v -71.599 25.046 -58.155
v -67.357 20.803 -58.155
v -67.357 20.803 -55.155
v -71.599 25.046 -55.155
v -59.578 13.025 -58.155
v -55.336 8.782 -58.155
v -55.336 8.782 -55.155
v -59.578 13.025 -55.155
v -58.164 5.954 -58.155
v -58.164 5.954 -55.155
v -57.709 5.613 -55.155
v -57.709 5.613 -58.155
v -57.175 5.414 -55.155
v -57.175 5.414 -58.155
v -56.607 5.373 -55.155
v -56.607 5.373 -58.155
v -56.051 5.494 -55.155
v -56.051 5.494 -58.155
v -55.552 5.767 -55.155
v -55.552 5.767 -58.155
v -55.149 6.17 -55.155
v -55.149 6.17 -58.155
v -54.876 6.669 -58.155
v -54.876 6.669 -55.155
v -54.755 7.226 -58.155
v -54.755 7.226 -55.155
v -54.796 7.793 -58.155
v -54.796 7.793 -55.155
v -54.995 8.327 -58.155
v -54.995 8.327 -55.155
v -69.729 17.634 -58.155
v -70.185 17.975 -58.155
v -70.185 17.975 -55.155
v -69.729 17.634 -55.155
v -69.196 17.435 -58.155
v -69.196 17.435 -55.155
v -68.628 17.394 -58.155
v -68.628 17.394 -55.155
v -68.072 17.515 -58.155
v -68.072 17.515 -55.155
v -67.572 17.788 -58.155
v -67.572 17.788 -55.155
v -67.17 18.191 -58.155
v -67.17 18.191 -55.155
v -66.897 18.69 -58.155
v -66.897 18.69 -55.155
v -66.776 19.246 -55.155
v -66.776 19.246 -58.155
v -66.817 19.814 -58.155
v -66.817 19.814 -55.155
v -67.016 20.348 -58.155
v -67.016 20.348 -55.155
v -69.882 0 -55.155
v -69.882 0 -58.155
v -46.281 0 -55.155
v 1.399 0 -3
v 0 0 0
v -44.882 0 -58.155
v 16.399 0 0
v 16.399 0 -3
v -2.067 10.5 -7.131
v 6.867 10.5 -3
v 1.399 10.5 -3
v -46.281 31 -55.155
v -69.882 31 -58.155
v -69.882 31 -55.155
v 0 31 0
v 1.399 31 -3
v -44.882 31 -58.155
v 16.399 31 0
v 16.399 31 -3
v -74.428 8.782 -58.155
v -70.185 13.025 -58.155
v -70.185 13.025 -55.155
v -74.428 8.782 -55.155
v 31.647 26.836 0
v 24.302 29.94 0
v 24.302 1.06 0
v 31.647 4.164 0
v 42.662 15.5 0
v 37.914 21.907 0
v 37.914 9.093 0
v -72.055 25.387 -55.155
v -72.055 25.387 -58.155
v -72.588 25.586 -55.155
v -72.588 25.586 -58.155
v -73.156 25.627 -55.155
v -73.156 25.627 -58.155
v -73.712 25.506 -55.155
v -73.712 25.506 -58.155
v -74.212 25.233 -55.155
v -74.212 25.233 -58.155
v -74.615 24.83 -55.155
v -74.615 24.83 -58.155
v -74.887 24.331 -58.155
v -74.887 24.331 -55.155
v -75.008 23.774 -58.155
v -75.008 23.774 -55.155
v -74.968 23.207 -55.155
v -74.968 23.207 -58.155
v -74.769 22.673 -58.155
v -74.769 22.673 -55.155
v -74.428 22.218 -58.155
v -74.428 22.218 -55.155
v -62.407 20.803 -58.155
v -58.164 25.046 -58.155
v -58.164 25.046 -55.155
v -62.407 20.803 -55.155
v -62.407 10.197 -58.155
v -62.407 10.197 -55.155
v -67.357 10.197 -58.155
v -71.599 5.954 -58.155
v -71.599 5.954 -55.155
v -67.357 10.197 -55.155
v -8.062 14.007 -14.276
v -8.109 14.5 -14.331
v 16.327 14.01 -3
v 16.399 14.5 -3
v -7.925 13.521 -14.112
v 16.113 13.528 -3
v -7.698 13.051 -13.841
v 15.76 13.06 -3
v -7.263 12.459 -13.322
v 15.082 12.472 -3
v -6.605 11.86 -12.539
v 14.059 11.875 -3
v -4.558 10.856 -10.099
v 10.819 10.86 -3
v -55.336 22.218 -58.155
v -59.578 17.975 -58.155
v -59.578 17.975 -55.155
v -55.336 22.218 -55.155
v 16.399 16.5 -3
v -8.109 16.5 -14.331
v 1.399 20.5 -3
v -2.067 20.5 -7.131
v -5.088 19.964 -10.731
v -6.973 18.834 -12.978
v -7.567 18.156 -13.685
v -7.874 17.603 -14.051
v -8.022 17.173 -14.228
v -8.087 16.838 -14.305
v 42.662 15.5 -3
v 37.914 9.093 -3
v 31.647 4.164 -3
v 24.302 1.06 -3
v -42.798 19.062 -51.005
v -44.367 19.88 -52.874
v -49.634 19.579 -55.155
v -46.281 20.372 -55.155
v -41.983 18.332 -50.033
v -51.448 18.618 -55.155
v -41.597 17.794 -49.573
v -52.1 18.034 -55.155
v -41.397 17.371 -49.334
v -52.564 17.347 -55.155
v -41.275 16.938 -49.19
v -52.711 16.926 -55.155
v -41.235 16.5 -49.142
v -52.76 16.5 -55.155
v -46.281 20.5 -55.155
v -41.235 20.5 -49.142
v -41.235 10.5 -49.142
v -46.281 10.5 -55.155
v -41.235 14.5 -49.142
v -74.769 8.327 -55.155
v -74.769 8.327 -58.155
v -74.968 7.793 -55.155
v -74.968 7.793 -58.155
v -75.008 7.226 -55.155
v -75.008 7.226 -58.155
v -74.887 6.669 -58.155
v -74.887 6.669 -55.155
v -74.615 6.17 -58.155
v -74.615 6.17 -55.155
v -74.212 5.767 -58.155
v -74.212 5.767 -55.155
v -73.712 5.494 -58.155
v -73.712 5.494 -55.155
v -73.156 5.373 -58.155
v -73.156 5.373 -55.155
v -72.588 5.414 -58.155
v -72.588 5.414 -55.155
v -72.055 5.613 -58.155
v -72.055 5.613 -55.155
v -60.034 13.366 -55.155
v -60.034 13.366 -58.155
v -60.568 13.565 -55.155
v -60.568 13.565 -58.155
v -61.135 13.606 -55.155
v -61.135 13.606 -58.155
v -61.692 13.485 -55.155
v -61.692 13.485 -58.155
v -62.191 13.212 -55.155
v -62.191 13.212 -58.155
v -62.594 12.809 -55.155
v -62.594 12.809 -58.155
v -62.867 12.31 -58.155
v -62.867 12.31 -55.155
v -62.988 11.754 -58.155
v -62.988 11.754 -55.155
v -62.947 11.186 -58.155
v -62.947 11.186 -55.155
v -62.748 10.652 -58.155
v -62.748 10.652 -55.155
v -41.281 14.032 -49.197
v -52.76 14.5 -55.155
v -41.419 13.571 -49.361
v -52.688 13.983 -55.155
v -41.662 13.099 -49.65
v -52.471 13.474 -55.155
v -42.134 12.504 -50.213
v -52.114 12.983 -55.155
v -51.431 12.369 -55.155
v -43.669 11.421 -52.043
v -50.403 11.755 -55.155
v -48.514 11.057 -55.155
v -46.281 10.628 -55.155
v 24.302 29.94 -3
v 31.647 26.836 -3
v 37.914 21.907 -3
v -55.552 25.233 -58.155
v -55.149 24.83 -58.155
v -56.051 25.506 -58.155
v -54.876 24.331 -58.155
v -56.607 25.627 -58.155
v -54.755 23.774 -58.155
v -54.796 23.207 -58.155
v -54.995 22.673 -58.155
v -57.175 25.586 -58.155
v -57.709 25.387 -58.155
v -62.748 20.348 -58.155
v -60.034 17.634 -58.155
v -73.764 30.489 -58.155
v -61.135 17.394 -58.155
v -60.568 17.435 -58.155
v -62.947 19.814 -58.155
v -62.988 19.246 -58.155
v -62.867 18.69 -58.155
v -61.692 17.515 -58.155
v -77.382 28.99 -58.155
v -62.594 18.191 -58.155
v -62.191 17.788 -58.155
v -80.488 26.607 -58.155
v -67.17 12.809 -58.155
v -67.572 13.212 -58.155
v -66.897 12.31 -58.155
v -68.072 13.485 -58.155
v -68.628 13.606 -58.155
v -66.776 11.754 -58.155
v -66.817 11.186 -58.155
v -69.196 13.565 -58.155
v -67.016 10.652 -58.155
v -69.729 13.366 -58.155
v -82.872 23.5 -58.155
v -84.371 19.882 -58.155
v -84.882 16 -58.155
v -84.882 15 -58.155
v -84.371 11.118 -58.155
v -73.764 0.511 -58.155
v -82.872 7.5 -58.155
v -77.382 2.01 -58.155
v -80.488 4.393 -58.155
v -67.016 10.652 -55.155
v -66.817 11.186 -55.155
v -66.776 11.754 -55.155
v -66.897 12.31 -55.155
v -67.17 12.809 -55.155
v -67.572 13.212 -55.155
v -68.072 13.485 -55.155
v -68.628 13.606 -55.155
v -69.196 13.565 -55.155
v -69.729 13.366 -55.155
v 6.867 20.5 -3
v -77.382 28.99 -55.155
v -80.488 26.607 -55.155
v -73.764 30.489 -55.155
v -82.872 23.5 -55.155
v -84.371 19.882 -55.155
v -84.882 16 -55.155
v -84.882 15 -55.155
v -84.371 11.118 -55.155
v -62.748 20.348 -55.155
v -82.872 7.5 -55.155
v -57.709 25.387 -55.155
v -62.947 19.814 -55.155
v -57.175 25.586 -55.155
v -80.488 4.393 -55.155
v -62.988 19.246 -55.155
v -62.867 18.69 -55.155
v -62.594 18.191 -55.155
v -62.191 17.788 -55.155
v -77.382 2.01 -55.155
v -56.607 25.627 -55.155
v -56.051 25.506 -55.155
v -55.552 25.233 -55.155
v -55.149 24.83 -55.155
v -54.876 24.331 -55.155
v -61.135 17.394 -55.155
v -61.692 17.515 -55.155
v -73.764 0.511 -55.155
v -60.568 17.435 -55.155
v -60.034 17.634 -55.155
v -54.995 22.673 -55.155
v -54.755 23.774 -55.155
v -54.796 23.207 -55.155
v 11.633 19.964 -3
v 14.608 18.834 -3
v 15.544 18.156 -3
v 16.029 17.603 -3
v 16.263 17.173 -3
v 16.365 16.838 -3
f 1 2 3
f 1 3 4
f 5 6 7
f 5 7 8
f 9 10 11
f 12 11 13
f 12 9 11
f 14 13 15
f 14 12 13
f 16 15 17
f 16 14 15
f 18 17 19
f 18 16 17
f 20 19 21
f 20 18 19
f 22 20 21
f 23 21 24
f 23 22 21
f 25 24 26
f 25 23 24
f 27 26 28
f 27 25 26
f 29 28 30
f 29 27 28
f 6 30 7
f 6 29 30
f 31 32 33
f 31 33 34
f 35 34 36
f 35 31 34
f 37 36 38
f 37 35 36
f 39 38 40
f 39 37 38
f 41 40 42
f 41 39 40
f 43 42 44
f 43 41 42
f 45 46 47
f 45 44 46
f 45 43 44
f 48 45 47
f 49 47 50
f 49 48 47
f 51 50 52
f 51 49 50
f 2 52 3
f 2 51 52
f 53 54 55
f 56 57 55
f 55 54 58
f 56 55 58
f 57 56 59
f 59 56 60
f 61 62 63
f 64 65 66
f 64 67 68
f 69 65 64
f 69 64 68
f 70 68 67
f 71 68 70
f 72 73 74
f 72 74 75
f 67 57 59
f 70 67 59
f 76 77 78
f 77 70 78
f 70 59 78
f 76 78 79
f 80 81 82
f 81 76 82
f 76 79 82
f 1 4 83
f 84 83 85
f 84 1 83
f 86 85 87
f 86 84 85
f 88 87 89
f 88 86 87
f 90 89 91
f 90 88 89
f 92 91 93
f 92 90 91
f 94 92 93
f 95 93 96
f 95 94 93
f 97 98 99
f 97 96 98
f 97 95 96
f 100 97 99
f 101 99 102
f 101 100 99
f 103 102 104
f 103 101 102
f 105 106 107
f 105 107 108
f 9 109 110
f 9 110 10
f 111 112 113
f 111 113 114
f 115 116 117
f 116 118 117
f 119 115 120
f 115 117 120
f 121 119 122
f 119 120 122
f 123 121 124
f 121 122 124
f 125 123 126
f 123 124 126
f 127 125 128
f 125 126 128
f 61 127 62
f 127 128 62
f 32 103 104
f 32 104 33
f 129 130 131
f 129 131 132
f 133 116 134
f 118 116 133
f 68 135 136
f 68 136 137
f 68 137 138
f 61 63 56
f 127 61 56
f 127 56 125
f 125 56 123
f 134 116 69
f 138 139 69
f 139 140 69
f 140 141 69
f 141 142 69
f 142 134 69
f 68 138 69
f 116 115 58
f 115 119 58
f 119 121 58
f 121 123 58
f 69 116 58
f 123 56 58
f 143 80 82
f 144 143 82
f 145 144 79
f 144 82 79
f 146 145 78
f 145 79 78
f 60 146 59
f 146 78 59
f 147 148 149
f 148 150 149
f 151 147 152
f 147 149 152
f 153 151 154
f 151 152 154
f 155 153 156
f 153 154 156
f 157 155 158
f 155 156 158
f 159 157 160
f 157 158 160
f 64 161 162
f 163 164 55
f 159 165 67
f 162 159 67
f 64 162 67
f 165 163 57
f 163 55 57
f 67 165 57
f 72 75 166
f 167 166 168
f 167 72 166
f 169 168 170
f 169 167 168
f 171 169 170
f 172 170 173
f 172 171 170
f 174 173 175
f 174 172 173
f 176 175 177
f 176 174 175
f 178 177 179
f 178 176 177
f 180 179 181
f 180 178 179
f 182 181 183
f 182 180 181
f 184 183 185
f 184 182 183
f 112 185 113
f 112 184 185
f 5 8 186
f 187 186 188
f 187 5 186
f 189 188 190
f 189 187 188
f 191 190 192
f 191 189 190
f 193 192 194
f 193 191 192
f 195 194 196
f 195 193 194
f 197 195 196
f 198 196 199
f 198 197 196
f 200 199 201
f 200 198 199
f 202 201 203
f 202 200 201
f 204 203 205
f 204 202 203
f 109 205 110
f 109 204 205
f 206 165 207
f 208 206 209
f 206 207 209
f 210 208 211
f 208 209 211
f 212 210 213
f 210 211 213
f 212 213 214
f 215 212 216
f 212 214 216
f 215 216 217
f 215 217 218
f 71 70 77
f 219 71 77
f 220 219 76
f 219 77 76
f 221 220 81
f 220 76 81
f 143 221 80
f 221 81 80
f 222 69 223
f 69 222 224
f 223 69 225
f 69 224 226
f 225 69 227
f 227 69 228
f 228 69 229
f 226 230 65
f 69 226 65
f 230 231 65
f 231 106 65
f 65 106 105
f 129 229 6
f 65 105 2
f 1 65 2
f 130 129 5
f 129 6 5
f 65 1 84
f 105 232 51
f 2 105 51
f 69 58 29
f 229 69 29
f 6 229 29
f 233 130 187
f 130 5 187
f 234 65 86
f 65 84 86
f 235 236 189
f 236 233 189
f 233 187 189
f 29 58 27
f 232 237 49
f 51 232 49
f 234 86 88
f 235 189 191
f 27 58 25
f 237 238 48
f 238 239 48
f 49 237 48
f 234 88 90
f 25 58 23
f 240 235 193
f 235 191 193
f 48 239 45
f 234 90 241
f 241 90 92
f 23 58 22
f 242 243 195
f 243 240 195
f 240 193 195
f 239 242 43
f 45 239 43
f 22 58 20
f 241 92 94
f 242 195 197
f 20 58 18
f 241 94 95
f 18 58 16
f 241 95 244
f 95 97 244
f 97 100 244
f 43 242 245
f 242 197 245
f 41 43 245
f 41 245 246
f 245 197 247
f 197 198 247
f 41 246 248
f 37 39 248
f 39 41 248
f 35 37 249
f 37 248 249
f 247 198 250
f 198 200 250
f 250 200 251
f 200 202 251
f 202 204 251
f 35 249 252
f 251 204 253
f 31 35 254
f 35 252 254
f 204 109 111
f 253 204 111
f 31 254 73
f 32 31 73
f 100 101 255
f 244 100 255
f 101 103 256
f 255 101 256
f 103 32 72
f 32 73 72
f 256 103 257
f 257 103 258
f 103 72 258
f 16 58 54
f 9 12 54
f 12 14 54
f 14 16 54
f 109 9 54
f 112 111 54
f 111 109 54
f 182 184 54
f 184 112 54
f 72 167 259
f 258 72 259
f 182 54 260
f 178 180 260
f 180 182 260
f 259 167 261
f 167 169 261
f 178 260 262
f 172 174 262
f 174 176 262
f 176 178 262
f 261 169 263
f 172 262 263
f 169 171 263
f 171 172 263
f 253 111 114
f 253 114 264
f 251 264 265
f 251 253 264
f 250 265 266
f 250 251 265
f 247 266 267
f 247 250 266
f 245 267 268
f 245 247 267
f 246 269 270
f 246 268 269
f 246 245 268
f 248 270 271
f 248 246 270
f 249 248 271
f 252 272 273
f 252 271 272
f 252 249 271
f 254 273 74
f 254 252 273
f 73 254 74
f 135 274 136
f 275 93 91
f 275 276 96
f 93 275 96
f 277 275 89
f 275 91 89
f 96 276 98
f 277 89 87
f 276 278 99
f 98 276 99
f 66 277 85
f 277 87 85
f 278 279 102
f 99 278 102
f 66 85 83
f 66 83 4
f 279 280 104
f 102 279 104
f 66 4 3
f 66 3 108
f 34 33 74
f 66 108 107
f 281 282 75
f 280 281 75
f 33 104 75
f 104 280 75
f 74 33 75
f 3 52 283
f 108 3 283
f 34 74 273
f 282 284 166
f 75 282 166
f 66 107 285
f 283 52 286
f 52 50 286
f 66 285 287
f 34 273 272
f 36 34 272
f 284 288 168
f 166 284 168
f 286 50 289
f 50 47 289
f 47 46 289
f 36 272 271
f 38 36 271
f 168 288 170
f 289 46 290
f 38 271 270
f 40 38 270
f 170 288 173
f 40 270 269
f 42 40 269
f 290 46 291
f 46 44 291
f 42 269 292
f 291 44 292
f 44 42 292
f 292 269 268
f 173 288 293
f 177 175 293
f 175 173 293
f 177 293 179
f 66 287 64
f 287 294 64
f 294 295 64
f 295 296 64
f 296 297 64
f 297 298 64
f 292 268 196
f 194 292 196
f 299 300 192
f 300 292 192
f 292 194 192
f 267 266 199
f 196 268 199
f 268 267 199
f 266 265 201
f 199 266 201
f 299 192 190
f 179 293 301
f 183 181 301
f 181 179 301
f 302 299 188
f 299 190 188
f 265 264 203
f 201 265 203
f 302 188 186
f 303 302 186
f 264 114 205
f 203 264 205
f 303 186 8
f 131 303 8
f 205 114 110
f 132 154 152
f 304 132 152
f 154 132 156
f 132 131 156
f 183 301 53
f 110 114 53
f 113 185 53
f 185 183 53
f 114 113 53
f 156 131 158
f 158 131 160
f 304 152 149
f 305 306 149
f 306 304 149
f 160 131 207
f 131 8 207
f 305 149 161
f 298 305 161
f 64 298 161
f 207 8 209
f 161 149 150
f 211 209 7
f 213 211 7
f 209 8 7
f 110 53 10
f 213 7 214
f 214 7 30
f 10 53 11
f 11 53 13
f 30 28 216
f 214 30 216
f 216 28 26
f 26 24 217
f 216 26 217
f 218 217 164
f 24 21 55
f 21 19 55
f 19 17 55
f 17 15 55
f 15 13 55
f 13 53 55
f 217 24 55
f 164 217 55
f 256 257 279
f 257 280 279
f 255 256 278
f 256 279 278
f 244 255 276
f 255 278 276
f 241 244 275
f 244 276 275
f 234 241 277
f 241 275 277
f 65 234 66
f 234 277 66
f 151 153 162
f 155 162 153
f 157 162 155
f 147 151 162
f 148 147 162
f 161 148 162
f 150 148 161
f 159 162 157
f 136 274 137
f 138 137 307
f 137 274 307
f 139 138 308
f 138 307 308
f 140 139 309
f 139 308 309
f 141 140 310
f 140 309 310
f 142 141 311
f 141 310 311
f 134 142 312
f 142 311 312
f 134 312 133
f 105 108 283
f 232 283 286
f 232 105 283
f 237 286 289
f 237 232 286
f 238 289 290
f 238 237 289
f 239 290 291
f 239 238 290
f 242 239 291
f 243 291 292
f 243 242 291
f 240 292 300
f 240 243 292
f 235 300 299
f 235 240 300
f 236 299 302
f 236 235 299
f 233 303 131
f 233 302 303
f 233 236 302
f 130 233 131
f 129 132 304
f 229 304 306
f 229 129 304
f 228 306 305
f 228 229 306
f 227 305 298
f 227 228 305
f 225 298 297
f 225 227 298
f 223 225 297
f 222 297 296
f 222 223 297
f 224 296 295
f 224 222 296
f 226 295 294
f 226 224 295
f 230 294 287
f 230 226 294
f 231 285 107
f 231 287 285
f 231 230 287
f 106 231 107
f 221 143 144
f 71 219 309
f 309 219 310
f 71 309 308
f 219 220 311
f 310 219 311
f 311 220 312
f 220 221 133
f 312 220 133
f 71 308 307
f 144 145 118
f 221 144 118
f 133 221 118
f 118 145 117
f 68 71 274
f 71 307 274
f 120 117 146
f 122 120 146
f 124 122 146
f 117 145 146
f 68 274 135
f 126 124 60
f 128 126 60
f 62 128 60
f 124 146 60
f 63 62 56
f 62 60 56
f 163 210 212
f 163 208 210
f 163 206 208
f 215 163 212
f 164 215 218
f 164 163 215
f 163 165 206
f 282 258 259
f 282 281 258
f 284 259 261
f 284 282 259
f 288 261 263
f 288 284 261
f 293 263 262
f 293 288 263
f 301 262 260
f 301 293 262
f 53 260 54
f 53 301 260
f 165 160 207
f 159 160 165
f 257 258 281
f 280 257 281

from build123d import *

# Parameters (mm, degrees)
SALIENTE_EXTRUIR2_DEPTH = 31
CORTAR_EXTRUIR1_DEPTH   = 10
REDONDEO4_R             = 15
REDONDEO7_R             = 30
SALIENTE_EXTRUIR3_DEPTH = 5
REDONDEO8_R             = 4
REDONDEO9_R             = 4
REDONDEO11_R            = 4


with BuildPart() as part:
    # Croquis2 → Saliente-Extruir2 (new body)
    with BuildSketch(Plane(origin=(0, 0, 0), x_dir=(1, 0, 0), z_dir=(0, 1, 0))):
        Polygon((-84.881784923, 58.155199905), (-84.881784923, 55.155199905), (-46.280707897, 55.155199905), (0, 0), (46.398922974, 0), (46.398922974, 3), (1.398922974, 3), (-44.881784923, 58.155199905), align=None)
    extrude(amount=SALIENTE_EXTRUIR2_DEPTH)

    # Croquis3 → Cortar-Extruir1 (cut)
    with BuildSketch(Plane(origin=(0, 0, -58.155199905), x_dir=(-1, 0, 0), z_dir=(0, 0, -1))):
        with BuildLine():
            Line((58.164270502, 25.045941546), (62.406911189, 20.803300859))
            ThreePointArc((62.406911189, 20.803300859), (62.406911189, 17.974873734), (59.578484064, 17.974873734))
            Line((59.578484064, 17.974873734), (55.335843377, 22.217514421))
            ThreePointArc((55.335843377, 22.217514421), (55.335843377, 25.045941546), (58.164270502, 25.045941546))
        make_face()
        with BuildLine():
            Line((71.599299344, 5.954058454), (67.356658657, 10.196699141))
            ThreePointArc((67.356658657, 10.196699141), (67.356658657, 13.025126266), (70.185085782, 13.025126266))
            Line((70.185085782, 13.025126266), (74.427726469, 8.782485579))
            ThreePointArc((74.427726469, 8.782485579), (74.427726469, 5.954058454), (71.599299344, 5.954058454))
        make_face()
        with BuildLine():
            Line((74.427726469, 22.217514421), (70.185085782, 17.974873734))
            ThreePointArc((70.185085782, 17.974873734), (67.356658657, 17.974873734), (67.356658657, 20.803300859))
            Line((67.356658657, 20.803300859), (71.599299344, 25.045941546))
            ThreePointArc((71.599299344, 25.045941546), (74.427726469, 25.045941546), (74.427726469, 22.217514421))
        make_face()
        with BuildLine():
            Line((55.335843377, 8.782485579), (59.578484064, 13.025126266))
            ThreePointArc((59.578484064, 13.025126266), (62.406911189, 13.025126266), (62.406911189, 10.196699141))
            Line((62.406911189, 10.196699141), (58.164270502, 5.954058454))
            ThreePointArc((58.164270502, 5.954058454), (55.335843377, 5.954058454), (55.335843377, 8.782485579))
        make_face()
    extrude(amount=-CORTAR_EXTRUIR1_DEPTH, mode=Mode.SUBTRACT)

    # Redondeo4
    redondeo4_edges = [part.edges().sort_by_distance(p)[0] for p in [
        (-84.881784923, 0, -56.655199905),
        (-84.881784923, 31, -56.655199905),
    ]]
    fillet(redondeo4_edges, radius=REDONDEO4_R)

    # Redondeo7
    # the kernel refuses this fillet: 30 mm, written as the material it takes off along each edge
    with BuildSketch(Plane(origin=(46.398922974, 0, 75), x_dir=(-1, 0, 0), z_dir=(0, 0, -1))) as redondeo7_piece_1:
        with BuildLine():
            CenterArc((REDONDEO7_R, REDONDEO7_R), REDONDEO7_R, 180, 90)
            Line((0, REDONDEO7_R), (0, 0))
            Line((0, 0), (REDONDEO7_R, 0))
        make_face()
    extrude(amount=153, mode=Mode.SUBTRACT)
    with BuildSketch(Plane(origin=(46.398922974, 31, 75), x_dir=(-1, 0, 0), z_dir=(0, 0, -1))) as redondeo7_piece_2:
        with BuildLine():
            CenterArc((REDONDEO7_R, -REDONDEO7_R), REDONDEO7_R, 90, 90)
            Line((0, -REDONDEO7_R), (0, 0))
            Line((0, 0), (REDONDEO7_R, 0))
        make_face()
    extrude(amount=153, mode=Mode.SUBTRACT)

    # Croquis4 → Saliente-Extruir3 (add, symmetric)
    with BuildSketch(Plane(origin=(0, 15.5, 0), x_dir=(1, 0, 0), z_dir=(0, 1, 0))):
        Polygon((-8.108577144, 14.330597423), (16.398922974, 3), (1.398922974, 3), align=None)
        Polygon((-52.760428047, 55.155199905), (-41.234854299, 49.141785751), (-46.280707897, 55.155199905), align=None)
    extrude(amount=SALIENTE_EXTRUIR3_DEPTH, both=True)

    # Redondeo8
    redondeo8_edges = [part.edges().sort_by_distance(p)[0] for p in [
        (4.145172915, 20.5, -8.665298711),
    ]]
    fillet(redondeo8_edges, radius=REDONDEO8_R)

    # Redondeo9
    redondeo9_edges = [part.edges().sort_by_distance(p)[0] for p in [
        (4.145172915, 10.5, -8.665298711),
    ]]
    fillet(redondeo9_edges, radius=REDONDEO9_R)

    # Redondeo11
    # the kernel refuses this fillet: 4 mm, written as the material it takes off along each edge
    with BuildSketch(Plane(origin=(-61.626254007, 10.5, -59.780903099), x_dir=(0, 1, 0), z_dir=(0.886582596003956, 0, 0.4625703194789808))) as redondeo11_piece_1_section:
        with BuildLine():
            CenterArc((REDONDEO11_R, -REDONDEO11_R), REDONDEO11_R, 90, 90)
            Line((0, -REDONDEO11_R), (0, 0))
            Line((0, 0), (REDONDEO11_R, 0))
        make_face()
    redondeo11_piece_1 = extrude(amount=33, mode=Mode.PRIVATE)
    redondeo11_piece_1 = split(redondeo11_piece_1, bisect_by=Plane(origin=(-45.320912512, 11.608841442, -54.011360305), z_dir=(-0.7660444431189792, 0, 0.642787609686538)), keep=Keep.TOP, mode=Mode.PRIVATE)
    redondeo11_piece_1 = split(redondeo11_piece_1, bisect_by=Plane(origin=(-46.861736651, 11.608841442, -55.155199905), z_dir=(0, 0, 1)), keep=Keep.TOP, mode=Mode.PRIVATE)
    add(redondeo11_piece_1, mode=Mode.SUBTRACT)
    with BuildSketch(Plane(origin=(-61.626254007, 20.5, -59.780903099), x_dir=(0.4625703194789808, 0, -0.886582596003956), z_dir=(0.886582596003956, 0, 0.4625703194789808))) as redondeo11_piece_2_section:
        with BuildLine():
            CenterArc((REDONDEO11_R, -REDONDEO11_R), REDONDEO11_R, 90, 90)
            Line((0, -REDONDEO11_R), (0, 0))
            Line((0, 0), (REDONDEO11_R, 0))
        make_face()
    redondeo11_piece_2 = extrude(amount=33, mode=Mode.PRIVATE)
    redondeo11_piece_2 = split(redondeo11_piece_2, bisect_by=Plane(origin=(-45.320912512, 19.391158558, -54.011360306), z_dir=(-0.7660444431189792, 0, 0.642787609686538)), keep=Keep.TOP, mode=Mode.PRIVATE)
    redondeo11_piece_2 = split(redondeo11_piece_2, bisect_by=Plane(origin=(-46.861736651, 19.391158558, -55.155199905), z_dir=(0, 0, 1)), keep=Keep.TOP, mode=Mode.PRIVATE)
    add(redondeo11_piece_2, mode=Mode.SUBTRACT)


solid = part.part
